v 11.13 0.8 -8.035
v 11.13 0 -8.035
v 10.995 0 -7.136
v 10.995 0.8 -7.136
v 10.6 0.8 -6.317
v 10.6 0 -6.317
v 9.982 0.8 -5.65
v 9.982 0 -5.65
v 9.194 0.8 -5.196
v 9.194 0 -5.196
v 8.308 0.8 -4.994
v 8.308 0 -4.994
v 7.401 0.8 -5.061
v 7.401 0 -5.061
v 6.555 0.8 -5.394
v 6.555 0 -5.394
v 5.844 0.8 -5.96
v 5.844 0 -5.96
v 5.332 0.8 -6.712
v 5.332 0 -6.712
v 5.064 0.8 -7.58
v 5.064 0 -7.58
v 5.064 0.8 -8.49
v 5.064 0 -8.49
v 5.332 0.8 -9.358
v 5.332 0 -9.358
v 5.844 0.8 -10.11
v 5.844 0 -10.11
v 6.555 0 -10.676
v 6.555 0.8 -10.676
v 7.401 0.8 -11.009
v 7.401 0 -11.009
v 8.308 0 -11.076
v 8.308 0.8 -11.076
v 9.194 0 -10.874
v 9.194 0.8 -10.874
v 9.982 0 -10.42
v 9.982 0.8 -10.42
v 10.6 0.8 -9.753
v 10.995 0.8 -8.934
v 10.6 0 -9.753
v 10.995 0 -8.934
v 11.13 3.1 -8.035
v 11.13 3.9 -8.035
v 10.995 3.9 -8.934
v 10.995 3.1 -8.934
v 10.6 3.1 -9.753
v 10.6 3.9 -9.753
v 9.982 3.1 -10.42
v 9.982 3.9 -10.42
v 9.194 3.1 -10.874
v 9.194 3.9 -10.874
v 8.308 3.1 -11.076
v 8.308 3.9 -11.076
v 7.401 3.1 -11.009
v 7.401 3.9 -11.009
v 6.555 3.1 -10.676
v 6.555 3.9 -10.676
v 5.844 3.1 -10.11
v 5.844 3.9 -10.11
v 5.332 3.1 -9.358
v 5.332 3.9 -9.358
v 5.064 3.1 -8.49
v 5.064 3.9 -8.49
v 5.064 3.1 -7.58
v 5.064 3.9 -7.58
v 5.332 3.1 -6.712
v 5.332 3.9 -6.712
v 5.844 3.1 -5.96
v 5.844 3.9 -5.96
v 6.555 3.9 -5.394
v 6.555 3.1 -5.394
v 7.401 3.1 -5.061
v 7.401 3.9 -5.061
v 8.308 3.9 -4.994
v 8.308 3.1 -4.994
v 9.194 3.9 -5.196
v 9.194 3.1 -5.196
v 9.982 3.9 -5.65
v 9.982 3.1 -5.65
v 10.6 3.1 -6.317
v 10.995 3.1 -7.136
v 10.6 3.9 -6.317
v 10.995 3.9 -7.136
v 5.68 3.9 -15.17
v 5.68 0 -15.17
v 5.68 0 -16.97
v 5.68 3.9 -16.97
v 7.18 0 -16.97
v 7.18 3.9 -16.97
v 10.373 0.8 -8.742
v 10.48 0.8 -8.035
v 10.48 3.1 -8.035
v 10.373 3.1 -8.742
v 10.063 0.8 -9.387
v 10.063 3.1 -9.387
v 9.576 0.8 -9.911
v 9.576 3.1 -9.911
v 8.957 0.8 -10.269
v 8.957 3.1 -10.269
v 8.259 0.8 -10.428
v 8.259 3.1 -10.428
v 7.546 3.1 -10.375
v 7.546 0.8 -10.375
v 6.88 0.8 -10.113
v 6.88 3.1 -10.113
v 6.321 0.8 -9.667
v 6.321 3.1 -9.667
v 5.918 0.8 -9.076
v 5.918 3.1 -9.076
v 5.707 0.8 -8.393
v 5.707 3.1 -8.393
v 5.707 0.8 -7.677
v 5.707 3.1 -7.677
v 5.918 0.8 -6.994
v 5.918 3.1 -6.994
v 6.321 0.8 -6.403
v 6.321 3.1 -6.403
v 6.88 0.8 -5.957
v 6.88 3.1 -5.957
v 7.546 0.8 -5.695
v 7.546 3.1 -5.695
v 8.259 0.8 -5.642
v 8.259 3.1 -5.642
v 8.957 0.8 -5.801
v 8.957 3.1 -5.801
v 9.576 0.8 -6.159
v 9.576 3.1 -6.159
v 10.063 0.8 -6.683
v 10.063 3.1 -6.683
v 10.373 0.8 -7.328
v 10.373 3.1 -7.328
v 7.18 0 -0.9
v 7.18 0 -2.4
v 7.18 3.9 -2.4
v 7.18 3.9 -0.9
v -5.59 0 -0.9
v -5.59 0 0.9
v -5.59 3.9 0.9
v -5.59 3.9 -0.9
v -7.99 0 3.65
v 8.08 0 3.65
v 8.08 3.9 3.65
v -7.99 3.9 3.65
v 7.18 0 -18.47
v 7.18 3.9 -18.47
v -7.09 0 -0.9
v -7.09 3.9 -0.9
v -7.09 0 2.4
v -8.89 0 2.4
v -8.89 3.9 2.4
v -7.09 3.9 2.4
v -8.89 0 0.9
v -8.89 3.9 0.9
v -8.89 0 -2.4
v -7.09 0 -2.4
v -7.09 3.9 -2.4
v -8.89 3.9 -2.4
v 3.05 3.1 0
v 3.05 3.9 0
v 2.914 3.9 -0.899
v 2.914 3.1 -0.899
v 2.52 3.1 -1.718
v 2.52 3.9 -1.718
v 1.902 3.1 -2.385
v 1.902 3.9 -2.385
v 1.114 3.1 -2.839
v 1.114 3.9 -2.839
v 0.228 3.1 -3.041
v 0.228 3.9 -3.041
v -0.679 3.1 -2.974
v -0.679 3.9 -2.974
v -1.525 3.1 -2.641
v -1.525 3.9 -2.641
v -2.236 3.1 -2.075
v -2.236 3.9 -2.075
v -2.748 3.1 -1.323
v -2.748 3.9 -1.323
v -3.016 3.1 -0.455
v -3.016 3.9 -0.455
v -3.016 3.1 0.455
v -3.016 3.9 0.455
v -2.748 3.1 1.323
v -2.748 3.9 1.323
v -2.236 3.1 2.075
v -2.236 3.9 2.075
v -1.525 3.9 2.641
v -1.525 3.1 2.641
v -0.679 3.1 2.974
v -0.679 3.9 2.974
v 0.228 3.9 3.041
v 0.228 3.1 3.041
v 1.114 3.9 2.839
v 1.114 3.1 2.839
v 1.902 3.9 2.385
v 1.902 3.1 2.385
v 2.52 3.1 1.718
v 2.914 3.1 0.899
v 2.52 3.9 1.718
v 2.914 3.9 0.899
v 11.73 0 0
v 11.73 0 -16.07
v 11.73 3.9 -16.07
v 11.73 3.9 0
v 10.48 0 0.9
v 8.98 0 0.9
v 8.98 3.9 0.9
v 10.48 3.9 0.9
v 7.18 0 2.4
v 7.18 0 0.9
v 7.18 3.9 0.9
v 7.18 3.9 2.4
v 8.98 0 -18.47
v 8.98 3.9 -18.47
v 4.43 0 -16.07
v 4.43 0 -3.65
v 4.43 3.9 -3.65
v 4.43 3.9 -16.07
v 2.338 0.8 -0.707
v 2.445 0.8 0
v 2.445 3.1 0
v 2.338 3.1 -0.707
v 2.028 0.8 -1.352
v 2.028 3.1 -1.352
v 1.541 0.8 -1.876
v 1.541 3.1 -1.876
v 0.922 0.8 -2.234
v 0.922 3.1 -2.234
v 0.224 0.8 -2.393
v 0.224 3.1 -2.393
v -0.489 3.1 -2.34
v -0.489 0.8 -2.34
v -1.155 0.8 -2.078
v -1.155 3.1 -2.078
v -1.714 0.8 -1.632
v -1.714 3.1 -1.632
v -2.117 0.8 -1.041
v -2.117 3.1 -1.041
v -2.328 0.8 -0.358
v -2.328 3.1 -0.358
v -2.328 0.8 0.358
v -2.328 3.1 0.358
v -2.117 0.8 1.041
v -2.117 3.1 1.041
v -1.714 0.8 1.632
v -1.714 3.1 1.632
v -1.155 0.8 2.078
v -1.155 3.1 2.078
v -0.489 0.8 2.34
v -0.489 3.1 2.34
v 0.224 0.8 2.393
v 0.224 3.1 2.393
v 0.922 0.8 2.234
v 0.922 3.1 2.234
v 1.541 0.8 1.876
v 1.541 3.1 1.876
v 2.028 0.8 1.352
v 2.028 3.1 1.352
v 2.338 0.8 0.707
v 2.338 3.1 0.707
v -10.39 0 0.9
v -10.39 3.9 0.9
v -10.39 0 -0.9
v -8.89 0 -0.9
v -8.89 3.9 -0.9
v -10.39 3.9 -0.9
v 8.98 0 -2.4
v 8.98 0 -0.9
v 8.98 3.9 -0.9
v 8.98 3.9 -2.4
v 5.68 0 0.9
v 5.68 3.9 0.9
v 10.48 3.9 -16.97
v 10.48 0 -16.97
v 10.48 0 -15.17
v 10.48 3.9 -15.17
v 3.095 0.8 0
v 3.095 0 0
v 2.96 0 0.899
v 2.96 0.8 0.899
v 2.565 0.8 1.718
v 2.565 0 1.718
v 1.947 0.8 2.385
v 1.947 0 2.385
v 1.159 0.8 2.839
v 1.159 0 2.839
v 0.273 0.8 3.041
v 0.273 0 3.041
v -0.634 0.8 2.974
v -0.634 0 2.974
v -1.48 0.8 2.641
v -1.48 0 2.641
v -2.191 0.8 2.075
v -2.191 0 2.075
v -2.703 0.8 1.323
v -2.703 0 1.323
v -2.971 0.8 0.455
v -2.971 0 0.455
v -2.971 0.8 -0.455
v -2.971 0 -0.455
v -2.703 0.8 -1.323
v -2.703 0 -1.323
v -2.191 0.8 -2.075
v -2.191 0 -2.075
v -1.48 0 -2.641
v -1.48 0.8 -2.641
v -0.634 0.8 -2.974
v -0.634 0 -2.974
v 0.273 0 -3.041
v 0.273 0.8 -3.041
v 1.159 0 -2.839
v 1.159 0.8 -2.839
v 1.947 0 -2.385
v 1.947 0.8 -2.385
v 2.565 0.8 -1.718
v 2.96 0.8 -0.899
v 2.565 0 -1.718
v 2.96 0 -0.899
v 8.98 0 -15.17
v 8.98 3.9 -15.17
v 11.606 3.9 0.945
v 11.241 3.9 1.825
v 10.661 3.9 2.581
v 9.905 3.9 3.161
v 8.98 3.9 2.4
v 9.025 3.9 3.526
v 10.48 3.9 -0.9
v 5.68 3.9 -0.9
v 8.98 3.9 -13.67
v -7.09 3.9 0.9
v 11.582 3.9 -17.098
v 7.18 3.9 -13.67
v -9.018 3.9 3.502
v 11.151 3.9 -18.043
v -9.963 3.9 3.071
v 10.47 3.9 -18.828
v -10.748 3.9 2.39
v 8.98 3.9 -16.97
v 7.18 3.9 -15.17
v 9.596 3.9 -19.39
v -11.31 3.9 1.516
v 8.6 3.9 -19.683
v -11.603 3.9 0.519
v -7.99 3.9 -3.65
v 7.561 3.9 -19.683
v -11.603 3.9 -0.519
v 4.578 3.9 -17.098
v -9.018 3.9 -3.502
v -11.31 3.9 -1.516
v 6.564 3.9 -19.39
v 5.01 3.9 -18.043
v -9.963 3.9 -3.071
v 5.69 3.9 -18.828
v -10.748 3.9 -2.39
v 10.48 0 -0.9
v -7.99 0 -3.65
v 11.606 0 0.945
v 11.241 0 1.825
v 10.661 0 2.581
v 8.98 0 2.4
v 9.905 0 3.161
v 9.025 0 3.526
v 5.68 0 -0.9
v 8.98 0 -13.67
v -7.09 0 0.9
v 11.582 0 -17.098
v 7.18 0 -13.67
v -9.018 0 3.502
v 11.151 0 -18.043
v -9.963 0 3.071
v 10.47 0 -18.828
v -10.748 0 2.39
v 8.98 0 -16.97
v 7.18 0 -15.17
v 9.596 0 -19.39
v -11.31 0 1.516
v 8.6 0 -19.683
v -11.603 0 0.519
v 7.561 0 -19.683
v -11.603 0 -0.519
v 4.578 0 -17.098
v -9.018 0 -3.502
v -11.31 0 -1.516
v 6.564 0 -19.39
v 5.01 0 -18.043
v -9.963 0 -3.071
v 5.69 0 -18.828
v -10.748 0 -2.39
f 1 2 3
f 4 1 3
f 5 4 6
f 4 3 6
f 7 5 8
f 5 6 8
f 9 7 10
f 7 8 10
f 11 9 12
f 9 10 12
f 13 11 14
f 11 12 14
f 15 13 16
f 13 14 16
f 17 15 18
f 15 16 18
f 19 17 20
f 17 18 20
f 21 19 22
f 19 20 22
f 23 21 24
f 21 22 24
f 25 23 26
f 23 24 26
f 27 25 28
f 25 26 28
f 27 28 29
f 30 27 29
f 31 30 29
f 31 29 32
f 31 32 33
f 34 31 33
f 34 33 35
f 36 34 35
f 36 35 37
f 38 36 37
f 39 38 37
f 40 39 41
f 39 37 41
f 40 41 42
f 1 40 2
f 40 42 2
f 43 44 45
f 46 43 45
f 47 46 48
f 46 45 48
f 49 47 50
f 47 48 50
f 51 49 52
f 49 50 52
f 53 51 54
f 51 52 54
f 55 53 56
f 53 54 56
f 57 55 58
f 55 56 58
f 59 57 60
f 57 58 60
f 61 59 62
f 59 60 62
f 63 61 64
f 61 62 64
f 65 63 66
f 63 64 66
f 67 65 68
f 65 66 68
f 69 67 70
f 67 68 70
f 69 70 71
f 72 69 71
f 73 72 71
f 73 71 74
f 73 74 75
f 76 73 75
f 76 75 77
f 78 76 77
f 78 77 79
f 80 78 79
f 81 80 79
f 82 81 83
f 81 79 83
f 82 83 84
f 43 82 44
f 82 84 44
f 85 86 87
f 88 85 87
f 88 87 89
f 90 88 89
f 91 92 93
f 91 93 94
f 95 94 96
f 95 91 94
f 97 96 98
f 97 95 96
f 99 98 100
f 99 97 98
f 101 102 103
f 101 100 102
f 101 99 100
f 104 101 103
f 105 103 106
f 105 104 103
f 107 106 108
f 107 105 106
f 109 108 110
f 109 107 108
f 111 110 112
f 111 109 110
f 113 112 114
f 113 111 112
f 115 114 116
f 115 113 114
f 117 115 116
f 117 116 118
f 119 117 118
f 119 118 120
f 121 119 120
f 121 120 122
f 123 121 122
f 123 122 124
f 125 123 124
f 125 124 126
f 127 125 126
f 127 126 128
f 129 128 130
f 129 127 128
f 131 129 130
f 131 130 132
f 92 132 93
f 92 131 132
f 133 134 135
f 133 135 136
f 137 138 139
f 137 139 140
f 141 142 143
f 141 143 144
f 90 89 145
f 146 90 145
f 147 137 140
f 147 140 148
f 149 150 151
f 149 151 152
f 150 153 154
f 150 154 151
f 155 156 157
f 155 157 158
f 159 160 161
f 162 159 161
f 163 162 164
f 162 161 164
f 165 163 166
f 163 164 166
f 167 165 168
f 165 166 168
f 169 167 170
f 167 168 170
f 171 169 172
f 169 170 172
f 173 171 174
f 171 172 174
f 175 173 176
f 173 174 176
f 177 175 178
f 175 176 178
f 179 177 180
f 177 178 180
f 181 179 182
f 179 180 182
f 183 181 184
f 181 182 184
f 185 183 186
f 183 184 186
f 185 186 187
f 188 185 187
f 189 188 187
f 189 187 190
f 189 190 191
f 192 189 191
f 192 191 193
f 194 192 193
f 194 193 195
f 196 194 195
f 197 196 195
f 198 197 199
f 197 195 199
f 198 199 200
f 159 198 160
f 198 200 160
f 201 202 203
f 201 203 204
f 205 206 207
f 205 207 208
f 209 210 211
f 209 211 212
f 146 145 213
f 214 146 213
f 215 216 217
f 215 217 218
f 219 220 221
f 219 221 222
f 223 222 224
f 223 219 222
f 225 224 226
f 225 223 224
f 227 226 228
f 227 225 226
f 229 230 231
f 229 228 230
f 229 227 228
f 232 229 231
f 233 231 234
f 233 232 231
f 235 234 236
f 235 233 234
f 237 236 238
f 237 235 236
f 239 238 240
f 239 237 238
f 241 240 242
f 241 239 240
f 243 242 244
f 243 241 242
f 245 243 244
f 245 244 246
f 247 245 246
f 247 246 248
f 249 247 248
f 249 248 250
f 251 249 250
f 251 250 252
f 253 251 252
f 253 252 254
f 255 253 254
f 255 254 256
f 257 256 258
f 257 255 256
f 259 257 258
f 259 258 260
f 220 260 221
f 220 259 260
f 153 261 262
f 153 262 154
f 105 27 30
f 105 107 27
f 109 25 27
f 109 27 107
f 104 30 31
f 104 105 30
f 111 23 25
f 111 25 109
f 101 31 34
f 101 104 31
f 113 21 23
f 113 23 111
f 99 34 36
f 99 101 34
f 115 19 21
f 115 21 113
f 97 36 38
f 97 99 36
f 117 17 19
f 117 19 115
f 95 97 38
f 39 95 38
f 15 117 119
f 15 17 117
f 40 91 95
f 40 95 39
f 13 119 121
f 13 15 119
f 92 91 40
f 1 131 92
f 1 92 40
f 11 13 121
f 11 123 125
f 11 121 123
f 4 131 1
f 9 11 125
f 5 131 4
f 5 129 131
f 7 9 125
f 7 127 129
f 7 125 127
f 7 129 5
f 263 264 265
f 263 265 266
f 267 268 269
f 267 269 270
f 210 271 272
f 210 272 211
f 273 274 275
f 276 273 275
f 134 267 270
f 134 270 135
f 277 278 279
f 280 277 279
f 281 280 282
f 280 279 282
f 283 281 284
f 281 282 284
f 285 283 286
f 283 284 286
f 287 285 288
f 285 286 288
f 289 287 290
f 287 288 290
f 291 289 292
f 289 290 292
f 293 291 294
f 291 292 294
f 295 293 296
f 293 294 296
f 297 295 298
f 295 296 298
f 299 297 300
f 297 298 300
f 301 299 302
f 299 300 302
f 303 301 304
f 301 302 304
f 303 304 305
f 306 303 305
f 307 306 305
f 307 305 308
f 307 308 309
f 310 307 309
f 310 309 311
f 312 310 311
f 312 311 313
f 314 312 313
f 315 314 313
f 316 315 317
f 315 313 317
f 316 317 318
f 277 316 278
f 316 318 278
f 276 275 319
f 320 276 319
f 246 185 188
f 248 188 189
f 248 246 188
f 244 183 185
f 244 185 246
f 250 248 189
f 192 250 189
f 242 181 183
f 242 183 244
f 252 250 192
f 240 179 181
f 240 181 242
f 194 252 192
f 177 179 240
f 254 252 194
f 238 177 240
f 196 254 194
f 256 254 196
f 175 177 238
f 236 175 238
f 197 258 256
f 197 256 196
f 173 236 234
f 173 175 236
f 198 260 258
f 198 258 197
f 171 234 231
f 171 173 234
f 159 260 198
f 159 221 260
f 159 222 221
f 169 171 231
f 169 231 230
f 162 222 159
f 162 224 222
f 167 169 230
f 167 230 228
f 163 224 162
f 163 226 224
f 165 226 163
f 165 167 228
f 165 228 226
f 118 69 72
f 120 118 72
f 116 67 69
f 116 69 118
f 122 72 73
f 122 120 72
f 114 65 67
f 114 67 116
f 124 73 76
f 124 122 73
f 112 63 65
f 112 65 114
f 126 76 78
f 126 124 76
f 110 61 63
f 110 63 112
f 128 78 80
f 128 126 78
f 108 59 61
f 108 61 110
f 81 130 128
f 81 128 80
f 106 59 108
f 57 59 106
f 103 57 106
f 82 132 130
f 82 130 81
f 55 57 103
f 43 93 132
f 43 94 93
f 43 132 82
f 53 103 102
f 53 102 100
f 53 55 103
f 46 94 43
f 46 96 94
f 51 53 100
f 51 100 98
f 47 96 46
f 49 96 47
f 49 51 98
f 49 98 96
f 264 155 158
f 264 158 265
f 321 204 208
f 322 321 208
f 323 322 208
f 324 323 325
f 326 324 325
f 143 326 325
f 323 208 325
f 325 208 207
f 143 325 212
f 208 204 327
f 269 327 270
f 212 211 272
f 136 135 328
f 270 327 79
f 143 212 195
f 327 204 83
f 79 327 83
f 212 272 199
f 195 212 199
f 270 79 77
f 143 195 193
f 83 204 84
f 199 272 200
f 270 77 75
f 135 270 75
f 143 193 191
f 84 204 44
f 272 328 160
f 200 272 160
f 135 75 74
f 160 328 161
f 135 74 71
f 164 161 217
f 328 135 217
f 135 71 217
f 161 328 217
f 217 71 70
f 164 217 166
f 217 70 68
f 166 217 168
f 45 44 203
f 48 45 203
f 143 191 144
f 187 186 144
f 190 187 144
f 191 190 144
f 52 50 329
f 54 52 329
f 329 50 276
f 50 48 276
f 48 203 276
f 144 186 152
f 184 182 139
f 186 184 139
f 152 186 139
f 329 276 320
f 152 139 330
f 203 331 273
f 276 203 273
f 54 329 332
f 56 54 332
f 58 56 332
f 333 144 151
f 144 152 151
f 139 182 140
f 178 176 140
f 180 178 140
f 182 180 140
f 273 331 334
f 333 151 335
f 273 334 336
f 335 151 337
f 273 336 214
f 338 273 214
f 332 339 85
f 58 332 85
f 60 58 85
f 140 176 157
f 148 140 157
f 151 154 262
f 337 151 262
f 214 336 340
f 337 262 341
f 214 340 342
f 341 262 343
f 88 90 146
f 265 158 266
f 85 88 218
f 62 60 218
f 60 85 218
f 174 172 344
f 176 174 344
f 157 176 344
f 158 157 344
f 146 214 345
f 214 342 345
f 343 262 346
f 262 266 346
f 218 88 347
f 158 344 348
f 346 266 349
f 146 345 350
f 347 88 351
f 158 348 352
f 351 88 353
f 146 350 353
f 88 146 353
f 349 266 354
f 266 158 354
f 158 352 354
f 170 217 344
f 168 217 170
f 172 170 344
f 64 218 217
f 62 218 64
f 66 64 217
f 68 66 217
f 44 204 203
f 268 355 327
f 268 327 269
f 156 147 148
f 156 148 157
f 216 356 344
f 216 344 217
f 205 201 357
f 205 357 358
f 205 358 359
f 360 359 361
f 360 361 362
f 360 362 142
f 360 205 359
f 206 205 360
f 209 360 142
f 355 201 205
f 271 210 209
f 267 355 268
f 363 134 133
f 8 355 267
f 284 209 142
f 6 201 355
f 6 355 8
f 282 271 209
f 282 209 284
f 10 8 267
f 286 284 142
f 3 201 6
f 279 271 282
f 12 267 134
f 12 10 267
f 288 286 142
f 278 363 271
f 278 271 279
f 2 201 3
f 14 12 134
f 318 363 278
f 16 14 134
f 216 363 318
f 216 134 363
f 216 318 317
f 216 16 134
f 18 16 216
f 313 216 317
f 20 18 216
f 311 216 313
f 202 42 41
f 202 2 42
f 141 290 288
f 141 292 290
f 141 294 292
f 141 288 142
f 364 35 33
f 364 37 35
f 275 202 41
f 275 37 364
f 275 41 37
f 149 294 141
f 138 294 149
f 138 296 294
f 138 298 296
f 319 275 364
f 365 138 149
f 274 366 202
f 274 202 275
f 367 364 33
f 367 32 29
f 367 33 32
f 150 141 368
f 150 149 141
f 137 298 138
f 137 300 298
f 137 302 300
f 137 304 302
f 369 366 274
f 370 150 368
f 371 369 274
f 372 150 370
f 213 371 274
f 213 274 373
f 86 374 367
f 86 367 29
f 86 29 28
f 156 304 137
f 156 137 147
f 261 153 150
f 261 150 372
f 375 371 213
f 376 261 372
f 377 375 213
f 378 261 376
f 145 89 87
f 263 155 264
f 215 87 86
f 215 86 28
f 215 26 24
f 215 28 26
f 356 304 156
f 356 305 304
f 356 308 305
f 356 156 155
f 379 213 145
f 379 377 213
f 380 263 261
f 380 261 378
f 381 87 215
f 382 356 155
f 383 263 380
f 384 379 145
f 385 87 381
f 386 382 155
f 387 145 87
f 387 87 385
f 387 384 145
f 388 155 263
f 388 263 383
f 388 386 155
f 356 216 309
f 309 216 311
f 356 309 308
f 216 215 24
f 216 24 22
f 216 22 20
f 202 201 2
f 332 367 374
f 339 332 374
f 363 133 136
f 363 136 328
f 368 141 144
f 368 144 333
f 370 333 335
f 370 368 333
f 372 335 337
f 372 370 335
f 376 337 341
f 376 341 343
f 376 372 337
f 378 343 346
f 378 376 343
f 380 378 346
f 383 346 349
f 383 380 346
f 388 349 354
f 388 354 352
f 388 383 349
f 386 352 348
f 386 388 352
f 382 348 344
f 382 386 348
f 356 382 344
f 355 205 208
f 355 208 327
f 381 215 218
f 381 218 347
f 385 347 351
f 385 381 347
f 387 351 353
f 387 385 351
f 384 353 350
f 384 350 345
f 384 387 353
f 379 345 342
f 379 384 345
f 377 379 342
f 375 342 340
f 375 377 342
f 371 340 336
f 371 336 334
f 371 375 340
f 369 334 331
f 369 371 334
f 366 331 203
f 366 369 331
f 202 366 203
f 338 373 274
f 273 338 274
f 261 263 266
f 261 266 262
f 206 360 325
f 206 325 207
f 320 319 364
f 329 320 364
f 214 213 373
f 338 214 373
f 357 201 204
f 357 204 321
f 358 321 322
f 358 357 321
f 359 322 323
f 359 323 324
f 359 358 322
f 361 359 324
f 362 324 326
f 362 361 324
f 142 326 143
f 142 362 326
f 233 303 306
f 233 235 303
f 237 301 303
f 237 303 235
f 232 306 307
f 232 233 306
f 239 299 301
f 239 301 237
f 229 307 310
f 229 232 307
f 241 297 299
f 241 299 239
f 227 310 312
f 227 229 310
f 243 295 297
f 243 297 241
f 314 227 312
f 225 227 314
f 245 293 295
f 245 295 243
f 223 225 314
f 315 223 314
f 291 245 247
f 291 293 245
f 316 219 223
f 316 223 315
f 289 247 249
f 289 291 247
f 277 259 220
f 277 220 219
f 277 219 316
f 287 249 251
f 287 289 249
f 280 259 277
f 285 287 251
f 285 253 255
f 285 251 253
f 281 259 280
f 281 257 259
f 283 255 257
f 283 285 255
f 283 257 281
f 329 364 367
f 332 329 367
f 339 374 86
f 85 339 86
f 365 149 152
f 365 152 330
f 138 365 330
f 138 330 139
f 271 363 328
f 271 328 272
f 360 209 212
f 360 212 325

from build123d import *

# Parameters (mm, degrees)
SKETCH1_R           = 2.4
BOSS_EXTRUDE1_DEPTH = 3.9
SKETCH2_R           = 3.05
CUT_EXTRUDE1_DEPTH  = 0.8
SKETCH3_R           = 3.05
CUT_EXTRUDE2_DEPTH  = 0.8


with BuildPart() as part:
    # Sketch1 → Boss-Extrude1 (new body)
    with BuildSketch(Plane(origin=(0, 0, 0), x_dir=(1, 0, 0), z_dir=(0, 1, 0))):
        with BuildLine():
            Line((-7.989922998, 3.65), (4.430077002, 3.65))
            Line((4.430077002, 3.65), (4.430077002, 16.07))
            ThreePointArc((4.430077002, 16.07), (8.080077002, 19.72), (11.730077002, 16.07))
            Line((11.730077002, 16.07), (11.730077002, 0))
            ThreePointArc((11.730077002, 0), (10.661016754, -2.580939751), (8.080077002, -3.65))
            Line((8.080077002, -3.65), (-7.989922998, -3.65))
            ThreePointArc((-7.989922998, -3.65), (-11.639922998, 0), (-7.989922998, 3.65))
        make_face()
        with Locations((0.045077002, 0)):
            Circle(SKETCH1_R, mode=Mode.SUBTRACT)
        with Locations((8.080077002, 8.035)):
            Circle(SKETCH1_R, mode=Mode.SUBTRACT)
        Polygon((8.980077002, 16.97), (10.480077002, 16.97), (10.480077002, 15.17), (8.980077002, 15.17), (8.980077002, 13.67), (7.180077002, 13.67), (7.180077002, 15.17), (5.680077002, 15.17), (5.680077002, 16.97), (7.180077002, 16.97), (7.180077002, 18.47), (8.980077002, 18.47), align=None, mode=Mode.SUBTRACT)
        Polygon((-8.889922998, -2.4), (-7.089922998, -2.4), (-7.089922998, -0.9), (-5.589922998, -0.9), (-5.589922998, 0.9), (-7.089922998, 0.9), (-7.089922998, 2.4), (-8.889922998, 2.4), (-8.889922998, 0.9), (-10.389922998, 0.9), (-10.389922998, -0.9), (-8.889922998, -0.9), align=None, mode=Mode.SUBTRACT)
        Polygon((7.180077002, -2.4), (8.980077002, -2.4), (8.980077002, -0.9), (10.480077002, -0.9), (10.480077002, 0.9), (8.980077002, 0.9), (8.980077002, 2.4), (7.180077002, 2.4), (7.180077002, 0.9), (5.680077002, 0.9), (5.680077002, -0.9), (7.180077002, -0.9), align=None, mode=Mode.SUBTRACT)
    extrude(amount=BOSS_EXTRUDE1_DEPTH)

    # Sketch2 → Cut-Extrude1 (cut)
    with BuildSketch(Plane(origin=(0, 3.9, 0), x_dir=(1, 0, 0), z_dir=(0, 1, 0))):
        Circle(SKETCH2_R)
        with Locations((8.080077002, 8.035)):
            Circle(SKETCH2_R)
    extrude(amount=-CUT_EXTRUDE1_DEPTH, mode=Mode.SUBTRACT)

    # Sketch3 → Cut-Extrude2 (cut)
    with BuildSketch(Plane.XZ):
        with Locations((8.080077002, -8.035)):
            Circle(SKETCH3_R)
        with Locations((0.045077002, 0)):
            Circle(SKETCH3_R)
    extrude(amount=-CUT_EXTRUDE2_DEPTH, mode=Mode.SUBTRACT)


solid = part.part
